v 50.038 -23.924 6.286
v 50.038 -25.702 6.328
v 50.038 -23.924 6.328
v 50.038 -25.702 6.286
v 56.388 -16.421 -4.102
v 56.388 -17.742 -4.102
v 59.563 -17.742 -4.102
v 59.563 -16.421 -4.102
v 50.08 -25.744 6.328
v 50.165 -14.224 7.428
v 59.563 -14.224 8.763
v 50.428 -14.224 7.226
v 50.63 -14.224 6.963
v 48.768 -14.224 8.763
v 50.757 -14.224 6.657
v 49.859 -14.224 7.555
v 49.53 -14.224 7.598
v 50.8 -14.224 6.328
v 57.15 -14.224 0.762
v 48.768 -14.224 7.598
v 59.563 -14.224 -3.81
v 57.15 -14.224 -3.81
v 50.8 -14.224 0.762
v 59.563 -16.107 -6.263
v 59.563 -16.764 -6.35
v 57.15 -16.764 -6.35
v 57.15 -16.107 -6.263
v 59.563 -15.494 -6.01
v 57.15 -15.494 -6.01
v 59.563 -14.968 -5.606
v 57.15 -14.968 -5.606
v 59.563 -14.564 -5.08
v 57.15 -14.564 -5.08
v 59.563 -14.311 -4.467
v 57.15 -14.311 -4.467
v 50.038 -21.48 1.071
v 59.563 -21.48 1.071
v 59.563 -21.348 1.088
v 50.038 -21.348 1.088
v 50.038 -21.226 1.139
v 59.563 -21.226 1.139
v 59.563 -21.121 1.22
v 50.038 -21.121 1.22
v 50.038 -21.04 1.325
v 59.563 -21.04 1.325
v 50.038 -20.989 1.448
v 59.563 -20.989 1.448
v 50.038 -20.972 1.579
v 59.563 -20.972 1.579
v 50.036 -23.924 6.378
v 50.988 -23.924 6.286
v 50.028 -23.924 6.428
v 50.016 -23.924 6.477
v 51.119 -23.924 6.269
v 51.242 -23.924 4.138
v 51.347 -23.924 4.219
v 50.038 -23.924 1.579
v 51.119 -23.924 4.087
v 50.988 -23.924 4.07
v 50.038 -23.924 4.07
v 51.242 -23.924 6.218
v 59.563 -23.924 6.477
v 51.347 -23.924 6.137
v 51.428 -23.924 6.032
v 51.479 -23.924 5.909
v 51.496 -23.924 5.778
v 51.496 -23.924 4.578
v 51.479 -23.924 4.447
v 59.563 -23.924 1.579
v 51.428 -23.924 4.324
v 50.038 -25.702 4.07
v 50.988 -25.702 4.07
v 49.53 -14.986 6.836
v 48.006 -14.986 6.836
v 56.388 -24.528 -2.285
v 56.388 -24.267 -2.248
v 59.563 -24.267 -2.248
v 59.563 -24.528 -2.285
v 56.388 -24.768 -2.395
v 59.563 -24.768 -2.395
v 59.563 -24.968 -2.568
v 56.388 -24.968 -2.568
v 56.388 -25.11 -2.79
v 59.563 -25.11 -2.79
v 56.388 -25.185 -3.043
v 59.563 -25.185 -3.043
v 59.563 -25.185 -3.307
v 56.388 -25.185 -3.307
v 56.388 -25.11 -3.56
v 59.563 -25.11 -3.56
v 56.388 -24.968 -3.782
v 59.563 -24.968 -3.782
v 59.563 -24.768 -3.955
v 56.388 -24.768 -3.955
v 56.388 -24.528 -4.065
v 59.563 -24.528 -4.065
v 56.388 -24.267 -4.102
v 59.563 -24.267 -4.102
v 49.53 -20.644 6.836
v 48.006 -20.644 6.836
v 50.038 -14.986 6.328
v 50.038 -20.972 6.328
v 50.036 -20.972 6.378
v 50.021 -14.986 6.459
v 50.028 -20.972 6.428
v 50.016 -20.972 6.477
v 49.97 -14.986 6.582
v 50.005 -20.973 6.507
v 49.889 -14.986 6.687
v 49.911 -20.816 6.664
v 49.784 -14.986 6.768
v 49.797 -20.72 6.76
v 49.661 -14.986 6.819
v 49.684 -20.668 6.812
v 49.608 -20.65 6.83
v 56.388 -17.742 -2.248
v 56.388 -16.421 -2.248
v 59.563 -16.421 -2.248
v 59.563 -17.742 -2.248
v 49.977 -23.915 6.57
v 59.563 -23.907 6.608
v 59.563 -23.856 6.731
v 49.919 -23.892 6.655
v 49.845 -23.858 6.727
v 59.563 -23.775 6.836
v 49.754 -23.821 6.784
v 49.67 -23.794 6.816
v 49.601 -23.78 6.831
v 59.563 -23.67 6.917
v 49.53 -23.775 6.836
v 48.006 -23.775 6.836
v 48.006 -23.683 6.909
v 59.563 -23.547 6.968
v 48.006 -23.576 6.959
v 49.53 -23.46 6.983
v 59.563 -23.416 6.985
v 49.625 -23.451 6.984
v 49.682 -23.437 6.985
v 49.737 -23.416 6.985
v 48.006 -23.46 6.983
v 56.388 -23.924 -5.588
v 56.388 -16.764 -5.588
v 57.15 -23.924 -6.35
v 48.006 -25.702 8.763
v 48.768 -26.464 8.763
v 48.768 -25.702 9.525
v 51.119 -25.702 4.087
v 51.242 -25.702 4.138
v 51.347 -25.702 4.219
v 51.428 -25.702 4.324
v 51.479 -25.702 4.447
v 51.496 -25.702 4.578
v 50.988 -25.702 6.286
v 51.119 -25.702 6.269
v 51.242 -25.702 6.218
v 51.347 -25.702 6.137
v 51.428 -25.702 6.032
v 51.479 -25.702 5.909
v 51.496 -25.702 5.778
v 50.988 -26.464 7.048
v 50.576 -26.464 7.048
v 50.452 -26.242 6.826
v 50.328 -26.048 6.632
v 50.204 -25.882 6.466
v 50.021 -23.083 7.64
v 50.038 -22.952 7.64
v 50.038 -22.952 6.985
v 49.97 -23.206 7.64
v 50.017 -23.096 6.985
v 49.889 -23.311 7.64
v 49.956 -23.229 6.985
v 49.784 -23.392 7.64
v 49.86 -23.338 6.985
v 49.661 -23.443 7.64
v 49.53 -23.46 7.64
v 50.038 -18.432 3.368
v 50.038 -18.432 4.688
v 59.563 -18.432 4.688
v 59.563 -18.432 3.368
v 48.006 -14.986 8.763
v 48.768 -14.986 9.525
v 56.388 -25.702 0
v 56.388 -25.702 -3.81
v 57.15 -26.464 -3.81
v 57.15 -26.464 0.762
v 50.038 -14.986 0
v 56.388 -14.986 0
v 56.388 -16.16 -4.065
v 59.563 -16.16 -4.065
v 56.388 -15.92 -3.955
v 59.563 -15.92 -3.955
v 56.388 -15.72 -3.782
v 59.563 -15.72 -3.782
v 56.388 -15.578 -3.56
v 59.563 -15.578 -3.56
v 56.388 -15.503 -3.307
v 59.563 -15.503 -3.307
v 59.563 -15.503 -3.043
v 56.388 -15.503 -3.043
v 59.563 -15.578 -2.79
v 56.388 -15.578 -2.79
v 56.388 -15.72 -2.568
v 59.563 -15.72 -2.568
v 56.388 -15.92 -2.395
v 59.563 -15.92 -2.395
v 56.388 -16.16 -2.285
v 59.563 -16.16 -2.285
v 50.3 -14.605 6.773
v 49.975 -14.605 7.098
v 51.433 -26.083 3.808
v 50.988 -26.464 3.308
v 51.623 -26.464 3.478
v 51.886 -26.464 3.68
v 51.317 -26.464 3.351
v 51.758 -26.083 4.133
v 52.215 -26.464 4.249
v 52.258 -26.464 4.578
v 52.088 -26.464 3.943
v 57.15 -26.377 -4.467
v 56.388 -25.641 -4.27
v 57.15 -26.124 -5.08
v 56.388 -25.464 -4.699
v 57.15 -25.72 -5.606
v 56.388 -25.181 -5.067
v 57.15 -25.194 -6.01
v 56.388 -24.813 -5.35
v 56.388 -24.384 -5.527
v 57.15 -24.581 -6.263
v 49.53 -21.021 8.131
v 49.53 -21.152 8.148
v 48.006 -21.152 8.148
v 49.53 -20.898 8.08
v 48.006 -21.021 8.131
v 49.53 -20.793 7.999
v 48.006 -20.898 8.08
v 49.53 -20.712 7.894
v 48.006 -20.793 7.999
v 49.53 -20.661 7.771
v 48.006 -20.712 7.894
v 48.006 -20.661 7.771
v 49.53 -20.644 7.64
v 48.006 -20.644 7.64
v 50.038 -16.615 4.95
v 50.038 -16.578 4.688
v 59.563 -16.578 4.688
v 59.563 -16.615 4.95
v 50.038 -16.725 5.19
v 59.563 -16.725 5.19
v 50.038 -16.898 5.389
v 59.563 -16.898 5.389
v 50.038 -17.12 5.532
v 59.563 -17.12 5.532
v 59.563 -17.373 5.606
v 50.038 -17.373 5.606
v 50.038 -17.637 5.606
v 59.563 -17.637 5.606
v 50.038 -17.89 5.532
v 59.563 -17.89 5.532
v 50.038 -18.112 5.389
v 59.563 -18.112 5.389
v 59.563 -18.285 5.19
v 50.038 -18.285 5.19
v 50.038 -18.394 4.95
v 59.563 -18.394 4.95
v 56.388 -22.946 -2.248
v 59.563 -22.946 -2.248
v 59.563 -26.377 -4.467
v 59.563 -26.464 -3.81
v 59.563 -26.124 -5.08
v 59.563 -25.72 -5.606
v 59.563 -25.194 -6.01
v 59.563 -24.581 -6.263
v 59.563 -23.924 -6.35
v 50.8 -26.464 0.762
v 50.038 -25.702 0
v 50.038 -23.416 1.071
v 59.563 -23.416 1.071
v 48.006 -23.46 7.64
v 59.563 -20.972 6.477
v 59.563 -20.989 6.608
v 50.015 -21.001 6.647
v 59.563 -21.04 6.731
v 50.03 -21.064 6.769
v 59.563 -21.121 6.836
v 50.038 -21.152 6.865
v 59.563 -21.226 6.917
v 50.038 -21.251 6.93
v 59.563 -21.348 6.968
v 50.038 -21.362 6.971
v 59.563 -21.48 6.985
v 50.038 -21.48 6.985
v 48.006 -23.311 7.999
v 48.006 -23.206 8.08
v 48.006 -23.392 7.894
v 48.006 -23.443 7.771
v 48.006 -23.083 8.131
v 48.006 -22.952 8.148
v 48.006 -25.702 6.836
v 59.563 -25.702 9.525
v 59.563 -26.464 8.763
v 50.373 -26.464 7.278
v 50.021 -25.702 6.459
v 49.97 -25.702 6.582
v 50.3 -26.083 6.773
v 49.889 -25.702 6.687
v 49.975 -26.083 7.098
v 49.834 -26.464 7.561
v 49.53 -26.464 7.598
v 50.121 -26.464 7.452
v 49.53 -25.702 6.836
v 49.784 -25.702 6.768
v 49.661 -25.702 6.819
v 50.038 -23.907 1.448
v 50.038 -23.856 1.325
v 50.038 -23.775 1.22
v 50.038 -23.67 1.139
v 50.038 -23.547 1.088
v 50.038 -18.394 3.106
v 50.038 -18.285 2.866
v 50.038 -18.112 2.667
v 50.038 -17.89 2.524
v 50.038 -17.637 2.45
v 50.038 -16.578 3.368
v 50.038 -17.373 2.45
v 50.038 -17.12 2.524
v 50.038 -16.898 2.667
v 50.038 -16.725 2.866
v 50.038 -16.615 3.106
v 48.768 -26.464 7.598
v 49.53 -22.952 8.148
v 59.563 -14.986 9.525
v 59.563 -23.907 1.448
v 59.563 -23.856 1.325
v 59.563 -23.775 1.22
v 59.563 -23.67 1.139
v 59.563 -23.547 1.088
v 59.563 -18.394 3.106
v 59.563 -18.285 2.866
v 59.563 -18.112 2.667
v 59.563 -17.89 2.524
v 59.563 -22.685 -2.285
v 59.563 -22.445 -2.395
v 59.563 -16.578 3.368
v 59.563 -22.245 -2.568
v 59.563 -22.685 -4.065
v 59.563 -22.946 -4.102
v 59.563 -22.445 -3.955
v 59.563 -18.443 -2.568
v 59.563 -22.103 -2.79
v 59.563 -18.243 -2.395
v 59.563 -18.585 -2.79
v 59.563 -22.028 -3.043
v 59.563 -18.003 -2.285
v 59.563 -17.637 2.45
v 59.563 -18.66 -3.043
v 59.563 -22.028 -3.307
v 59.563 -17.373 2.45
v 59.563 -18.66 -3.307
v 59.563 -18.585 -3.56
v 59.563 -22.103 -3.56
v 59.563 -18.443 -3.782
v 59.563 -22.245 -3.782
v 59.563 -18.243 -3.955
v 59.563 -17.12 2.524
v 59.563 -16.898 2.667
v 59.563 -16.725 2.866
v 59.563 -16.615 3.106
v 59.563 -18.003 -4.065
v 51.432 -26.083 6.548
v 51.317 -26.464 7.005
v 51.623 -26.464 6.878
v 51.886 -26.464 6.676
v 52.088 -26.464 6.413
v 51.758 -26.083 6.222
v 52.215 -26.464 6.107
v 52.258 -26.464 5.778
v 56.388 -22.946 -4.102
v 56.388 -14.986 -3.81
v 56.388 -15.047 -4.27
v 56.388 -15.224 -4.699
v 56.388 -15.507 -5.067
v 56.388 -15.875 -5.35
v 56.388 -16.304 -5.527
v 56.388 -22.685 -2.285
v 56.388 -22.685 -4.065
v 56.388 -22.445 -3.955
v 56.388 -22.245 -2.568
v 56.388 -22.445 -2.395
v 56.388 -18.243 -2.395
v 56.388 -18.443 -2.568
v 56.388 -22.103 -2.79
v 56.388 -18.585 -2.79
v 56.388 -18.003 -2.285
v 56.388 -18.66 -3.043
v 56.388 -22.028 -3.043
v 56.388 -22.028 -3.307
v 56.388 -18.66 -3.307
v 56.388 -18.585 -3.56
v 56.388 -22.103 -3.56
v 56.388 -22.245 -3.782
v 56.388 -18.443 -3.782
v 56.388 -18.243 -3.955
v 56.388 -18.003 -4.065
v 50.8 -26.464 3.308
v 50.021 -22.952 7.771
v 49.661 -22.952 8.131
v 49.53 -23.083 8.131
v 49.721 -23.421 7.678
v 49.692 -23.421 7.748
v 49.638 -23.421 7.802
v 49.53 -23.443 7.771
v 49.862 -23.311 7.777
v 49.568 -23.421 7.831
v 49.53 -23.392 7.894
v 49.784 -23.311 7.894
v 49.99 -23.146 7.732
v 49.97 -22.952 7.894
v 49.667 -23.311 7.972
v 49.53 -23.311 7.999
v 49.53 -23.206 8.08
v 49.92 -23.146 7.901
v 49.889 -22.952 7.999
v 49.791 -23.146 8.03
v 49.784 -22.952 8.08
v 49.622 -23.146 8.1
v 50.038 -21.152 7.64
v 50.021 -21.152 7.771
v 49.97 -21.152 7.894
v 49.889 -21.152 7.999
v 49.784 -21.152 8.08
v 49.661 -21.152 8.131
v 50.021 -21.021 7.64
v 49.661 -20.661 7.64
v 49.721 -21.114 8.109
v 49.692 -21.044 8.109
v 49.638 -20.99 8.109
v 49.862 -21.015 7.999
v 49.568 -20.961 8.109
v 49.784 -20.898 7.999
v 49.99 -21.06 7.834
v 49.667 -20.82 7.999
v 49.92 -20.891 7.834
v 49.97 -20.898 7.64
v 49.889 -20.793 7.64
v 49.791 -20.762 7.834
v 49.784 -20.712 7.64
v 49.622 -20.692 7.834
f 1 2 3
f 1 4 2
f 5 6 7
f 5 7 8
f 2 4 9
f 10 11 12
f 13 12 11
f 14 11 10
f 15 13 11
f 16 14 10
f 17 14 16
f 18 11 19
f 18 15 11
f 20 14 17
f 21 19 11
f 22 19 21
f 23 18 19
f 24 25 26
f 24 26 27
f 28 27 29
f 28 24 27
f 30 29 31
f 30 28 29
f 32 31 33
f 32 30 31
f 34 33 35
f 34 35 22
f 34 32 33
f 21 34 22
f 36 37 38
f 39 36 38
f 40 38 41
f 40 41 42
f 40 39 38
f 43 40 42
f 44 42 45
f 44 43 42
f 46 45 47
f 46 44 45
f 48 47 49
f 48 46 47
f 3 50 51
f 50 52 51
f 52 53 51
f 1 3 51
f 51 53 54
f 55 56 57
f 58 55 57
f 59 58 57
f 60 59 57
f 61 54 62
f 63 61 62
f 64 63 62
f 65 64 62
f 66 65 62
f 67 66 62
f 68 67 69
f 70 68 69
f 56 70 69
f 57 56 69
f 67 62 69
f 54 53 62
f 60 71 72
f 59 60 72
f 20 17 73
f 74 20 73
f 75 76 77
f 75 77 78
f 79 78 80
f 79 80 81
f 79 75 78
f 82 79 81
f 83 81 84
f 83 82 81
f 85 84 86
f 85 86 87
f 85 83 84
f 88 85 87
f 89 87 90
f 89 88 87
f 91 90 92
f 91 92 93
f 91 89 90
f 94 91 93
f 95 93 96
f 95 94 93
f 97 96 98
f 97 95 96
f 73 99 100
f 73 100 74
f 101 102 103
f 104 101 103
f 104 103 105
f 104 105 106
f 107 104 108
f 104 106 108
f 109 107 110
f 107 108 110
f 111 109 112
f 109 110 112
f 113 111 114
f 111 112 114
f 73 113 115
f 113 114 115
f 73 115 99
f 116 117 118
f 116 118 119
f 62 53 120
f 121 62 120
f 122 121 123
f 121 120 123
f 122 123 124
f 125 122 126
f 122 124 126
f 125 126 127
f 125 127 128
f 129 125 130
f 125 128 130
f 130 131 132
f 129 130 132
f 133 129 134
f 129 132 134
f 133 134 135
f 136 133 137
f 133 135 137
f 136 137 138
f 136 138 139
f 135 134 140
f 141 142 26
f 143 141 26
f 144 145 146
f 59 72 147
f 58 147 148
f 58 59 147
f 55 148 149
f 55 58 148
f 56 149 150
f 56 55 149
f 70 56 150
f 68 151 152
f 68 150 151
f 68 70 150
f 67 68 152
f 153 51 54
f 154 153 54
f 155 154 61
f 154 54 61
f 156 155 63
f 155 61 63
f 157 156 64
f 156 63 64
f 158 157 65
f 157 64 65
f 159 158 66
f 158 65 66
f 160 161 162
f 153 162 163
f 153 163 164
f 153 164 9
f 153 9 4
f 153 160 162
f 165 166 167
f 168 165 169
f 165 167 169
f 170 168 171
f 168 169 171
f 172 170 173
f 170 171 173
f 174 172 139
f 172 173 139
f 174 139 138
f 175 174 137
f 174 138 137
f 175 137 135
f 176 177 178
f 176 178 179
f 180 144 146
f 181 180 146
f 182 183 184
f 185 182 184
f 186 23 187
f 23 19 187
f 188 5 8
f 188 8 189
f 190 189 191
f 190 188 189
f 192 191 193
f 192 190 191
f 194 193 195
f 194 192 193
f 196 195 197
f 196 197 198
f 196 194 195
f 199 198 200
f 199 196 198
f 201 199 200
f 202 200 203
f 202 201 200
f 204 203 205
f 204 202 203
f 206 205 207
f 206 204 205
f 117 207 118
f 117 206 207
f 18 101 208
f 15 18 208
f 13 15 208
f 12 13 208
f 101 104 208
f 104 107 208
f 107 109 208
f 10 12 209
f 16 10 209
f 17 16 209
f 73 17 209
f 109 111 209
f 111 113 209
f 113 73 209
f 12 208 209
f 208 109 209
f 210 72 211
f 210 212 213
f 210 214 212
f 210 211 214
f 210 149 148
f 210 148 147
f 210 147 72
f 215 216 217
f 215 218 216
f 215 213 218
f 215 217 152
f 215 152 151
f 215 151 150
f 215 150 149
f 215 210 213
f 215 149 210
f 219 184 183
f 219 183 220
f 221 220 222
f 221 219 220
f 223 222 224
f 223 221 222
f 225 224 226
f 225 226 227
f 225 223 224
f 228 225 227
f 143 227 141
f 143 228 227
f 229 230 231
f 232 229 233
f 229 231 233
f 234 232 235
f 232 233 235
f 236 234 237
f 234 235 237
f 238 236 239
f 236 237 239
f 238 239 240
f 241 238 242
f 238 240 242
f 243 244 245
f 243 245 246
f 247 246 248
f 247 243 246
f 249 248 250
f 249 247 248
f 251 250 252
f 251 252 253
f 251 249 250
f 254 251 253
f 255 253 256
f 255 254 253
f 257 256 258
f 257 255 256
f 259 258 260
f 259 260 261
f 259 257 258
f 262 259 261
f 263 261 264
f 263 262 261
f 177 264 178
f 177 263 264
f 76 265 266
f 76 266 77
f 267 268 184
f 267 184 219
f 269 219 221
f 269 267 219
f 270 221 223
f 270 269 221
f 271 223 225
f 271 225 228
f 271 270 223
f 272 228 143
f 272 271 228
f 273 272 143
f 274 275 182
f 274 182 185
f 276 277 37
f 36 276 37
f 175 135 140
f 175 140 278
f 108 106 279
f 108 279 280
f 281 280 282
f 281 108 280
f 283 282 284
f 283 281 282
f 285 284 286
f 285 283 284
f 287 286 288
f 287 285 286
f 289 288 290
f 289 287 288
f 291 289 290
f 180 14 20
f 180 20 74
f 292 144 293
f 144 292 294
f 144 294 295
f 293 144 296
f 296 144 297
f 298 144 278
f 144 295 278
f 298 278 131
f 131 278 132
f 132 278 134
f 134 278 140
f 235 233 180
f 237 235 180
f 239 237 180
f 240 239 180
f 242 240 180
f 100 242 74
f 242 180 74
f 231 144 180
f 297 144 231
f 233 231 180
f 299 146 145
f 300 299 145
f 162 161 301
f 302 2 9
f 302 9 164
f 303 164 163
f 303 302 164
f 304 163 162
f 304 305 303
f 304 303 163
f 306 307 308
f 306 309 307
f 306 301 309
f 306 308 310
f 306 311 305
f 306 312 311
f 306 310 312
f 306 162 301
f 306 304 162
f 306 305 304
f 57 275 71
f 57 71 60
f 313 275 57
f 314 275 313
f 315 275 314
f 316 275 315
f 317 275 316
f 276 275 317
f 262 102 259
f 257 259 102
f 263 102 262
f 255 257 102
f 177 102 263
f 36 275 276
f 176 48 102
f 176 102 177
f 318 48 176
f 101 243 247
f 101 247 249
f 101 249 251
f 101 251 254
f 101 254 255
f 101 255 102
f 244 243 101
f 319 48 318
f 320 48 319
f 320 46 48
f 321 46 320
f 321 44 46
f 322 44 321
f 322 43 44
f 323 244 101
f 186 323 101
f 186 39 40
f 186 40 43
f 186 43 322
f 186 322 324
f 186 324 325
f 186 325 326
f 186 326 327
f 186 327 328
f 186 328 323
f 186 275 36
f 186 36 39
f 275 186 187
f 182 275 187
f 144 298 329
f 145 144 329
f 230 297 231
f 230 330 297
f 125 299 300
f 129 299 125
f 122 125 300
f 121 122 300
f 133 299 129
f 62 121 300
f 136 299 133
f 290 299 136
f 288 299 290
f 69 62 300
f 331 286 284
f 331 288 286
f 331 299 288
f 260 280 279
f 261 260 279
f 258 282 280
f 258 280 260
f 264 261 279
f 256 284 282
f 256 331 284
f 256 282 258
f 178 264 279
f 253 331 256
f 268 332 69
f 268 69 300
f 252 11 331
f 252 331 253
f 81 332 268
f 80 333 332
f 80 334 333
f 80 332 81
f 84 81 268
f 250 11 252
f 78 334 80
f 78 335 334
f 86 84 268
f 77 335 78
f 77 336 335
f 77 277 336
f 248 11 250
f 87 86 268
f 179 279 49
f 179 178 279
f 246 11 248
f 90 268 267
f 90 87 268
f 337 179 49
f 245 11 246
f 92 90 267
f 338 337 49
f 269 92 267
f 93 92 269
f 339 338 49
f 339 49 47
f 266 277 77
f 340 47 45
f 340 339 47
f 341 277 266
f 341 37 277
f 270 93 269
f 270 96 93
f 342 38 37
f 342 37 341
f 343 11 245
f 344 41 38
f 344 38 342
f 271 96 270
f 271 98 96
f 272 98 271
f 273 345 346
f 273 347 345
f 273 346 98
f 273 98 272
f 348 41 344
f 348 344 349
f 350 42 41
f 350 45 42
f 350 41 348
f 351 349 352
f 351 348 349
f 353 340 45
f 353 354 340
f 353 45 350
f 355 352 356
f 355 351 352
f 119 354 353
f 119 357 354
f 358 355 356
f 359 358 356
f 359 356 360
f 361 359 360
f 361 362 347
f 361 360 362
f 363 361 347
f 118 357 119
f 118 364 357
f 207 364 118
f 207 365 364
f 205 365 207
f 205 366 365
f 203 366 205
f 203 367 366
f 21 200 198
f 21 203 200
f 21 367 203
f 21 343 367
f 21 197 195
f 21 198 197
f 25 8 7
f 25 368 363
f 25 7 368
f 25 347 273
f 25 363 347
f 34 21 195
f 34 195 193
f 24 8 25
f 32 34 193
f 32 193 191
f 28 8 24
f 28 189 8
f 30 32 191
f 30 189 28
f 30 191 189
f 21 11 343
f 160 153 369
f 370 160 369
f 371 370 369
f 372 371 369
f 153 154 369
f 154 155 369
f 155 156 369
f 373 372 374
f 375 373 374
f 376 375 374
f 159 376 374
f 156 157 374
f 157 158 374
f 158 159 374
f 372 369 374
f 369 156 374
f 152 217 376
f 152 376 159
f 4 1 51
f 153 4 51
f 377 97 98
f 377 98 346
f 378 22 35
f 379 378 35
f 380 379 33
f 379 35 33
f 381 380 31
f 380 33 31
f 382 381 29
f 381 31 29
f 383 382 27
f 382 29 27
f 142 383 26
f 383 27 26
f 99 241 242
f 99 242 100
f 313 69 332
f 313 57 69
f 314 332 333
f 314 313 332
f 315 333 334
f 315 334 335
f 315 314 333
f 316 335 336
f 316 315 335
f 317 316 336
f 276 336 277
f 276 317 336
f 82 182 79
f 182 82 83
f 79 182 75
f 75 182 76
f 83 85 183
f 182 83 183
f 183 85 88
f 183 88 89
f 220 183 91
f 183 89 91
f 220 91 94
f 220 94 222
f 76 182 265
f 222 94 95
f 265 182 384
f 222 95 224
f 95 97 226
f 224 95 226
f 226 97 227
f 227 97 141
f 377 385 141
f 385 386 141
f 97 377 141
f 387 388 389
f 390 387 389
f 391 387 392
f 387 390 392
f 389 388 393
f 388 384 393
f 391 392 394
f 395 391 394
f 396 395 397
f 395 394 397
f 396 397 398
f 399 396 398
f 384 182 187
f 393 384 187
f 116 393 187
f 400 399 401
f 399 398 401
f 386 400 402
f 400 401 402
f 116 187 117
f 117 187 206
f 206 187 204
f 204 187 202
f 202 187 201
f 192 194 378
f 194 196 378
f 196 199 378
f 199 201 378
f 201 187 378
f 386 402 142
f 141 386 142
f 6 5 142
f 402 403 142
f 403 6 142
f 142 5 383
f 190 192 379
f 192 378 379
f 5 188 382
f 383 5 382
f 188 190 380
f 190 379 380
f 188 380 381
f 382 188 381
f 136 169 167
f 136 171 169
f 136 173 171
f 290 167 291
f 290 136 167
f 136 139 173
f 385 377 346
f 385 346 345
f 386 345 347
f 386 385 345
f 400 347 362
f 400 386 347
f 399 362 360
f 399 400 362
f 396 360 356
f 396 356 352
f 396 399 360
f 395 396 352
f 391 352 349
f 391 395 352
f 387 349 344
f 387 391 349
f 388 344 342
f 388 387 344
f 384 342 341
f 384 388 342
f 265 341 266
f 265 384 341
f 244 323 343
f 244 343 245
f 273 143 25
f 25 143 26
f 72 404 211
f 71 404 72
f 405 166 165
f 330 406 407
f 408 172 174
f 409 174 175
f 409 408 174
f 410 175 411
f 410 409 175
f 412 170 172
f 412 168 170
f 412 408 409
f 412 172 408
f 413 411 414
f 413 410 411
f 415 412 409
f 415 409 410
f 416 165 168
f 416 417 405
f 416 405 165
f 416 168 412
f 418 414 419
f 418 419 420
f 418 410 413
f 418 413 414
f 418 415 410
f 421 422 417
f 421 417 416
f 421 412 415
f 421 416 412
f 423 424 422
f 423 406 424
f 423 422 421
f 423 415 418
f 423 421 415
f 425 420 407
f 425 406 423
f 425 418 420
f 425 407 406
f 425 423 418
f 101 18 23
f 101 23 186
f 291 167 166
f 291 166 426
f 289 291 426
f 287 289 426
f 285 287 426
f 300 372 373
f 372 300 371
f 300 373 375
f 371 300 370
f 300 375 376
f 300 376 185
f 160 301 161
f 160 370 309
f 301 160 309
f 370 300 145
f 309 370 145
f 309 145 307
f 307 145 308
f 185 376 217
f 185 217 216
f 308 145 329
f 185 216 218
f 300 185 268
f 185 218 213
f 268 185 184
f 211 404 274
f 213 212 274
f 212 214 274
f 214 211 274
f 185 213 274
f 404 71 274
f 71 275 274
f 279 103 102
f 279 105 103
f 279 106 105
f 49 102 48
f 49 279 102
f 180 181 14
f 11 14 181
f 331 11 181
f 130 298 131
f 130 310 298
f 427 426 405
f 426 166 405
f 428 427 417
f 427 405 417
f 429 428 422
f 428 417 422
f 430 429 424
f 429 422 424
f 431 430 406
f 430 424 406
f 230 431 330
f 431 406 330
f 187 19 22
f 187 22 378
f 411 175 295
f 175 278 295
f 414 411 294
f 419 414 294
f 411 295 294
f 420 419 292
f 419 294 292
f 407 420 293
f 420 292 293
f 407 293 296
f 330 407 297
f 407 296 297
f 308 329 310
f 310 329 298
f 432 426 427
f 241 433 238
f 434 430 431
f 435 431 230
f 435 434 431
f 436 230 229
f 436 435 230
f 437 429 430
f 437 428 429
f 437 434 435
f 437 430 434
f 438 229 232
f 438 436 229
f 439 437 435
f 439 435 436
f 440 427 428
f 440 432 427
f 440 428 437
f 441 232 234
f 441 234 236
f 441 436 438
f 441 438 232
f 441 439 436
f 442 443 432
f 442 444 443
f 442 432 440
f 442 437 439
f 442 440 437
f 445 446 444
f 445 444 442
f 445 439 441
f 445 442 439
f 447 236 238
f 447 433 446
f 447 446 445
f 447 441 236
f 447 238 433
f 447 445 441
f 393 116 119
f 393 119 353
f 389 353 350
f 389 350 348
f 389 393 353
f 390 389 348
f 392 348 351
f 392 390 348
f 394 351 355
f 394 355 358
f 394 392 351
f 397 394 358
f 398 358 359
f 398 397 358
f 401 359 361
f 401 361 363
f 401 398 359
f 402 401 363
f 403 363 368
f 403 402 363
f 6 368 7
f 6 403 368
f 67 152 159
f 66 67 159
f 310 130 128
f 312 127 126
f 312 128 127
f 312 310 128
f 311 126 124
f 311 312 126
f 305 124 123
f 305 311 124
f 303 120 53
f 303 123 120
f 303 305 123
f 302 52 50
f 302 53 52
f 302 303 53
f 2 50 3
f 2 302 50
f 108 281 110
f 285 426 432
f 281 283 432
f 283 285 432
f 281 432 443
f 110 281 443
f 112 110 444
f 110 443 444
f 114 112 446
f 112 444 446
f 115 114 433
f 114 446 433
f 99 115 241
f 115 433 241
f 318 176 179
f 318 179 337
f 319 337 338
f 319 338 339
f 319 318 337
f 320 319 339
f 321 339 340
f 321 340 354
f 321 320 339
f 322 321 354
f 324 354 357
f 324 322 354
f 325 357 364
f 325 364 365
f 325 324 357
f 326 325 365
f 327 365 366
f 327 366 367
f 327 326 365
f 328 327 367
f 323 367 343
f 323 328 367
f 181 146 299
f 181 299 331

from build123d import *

# Parameters (mm, degrees)
SKETCH1_W                 = 6.35
SKETCH1_H                 = 12.24
BOSS_EXTRUDE1_DEPTH       = 8.255
BOSS_EXTRUDE2_DEPTH       = 2.032
BOSS_EXTRUDE2_DEPTH_BACK  = 6.35
SKETCH3_W                 = 1.458
SKETCH3_H                 = 2.216
CUT_EXTRUDE1_DEPTH        = 3.81
SKETCH9_W                 = 15.875
SKETCH9_H                 = 12.24
BOSS_EXTRUDE3_DEPTH       = 3.175
FILLET2_R                 = 2.54
F_0_START                 = 50.038
F_0_CLEARANCE_SLOT1_DEPTH = 9.525
F_0_START_2               = 56.388
F_0_CLEARANCE_SLOT2_DEPTH = 3.175
FILLET3_R                 = 0.508
SKETCH12_W                = 5.914
SKETCH12_H                = 2.952219173
CUT_EXTRUDE2_DEPTH        = 31.407781492
FILLET4_R                 = 0.508


# Read off the part's stored shape, not the designer's step: #0 Clearance Slot1, #0 Clearance Slot2
with BuildPart() as part:
    # Sketch1 → Boss-Extrude1 (new body)
    with BuildSketch(Plane.XY):
        with Locations((53.213, -20.344)):
            Rectangle(SKETCH1_W, SKETCH1_H)
    extrude(amount=BOSS_EXTRUDE1_DEPTH)

    # Sketch2 → Boss-Extrude2 (add, two sides: drawn at the far end of the back side and taken through both)
    with BuildSketch(Plane.ZY.offset(-50.038).offset(-BOSS_EXTRUDE2_DEPTH_BACK)):
        Polygon((9.525, -26.464), (6.836, -26.464), (6.836, -23.46), (8.148, -23.46), (8.148, -20.644), (6.836, -20.644), (6.836, -14.224), (9.525, -14.224), align=None)
    extrude(amount=BOSS_EXTRUDE2_DEPTH + BOSS_EXTRUDE2_DEPTH_BACK)

    # Sketch3 → Cut-Extrude1 (cut)
    with BuildSketch(Plane.XZ.offset(26.464)):
        with Locations((50.767, 5.178)):
            Rectangle(SKETCH3_W, SKETCH3_H)
    extrude(amount=-CUT_EXTRUDE1_DEPTH, mode=Mode.SUBTRACT)

    # Sketch9 → Boss-Extrude3 (add)
    with BuildSketch(Plane(origin=(56.388, 0, 0), x_dir=(0, 0, -1), z_dir=(1, 0, 0))):
        with Locations((-1.5875, -20.344)):
            Rectangle(SKETCH9_W, SKETCH9_H)
    extrude(amount=BOSS_EXTRUDE3_DEPTH)

    # Fillet2
    fillet2_edges = [part.edges().sort_by_distance(p)[0] for p in [
        (57.9755, -14.224, -6.35),
        (57.9755, -26.464, -6.35),
    ]]
    fillet(fillet2_edges, radius=FILLET2_R)

    # #0 Clearance Slot1 outline → #0 Clearance Slot1 (cut)
    with BuildSketch(Plane.YZ.offset(F_0_START)):
        with BuildLine():
            Line((-18.431780827, 4.6884), (-18.431780827, 3.3676))
            ThreePointArc((-18.431780827, 3.3676), (-17.504680827, 2.4405), (-16.577580827, 3.3676))
            Line((-16.577580827, 3.3676), (-16.577580827, 4.6884))
            ThreePointArc((-16.577580827, 4.6884), (-17.504680827, 5.6155), (-18.431780827, 4.6884))
        make_face()
    extrude(amount=F_0_CLEARANCE_SLOT1_DEPTH, mode=Mode.SUBTRACT)

    # #0 Clearance Slot2 outline → #0 Clearance Slot2 (cut)
    with BuildSketch(Plane.YZ.offset(F_0_START_2)):
        with BuildLine():
            Line((-22.9461, -2.2479), (-24.2669, -2.2479))
            ThreePointArc((-24.2669, -2.2479), (-25.194, -3.175), (-24.2669, -4.1021))
            Line((-24.2669, -4.1021), (-22.9461, -4.1021))
            ThreePointArc((-22.9461, -4.1021), (-22.019, -3.175), (-22.9461, -2.2479))
        make_face()
        with BuildLine():
            ThreePointArc((-16.4211, -4.1021), (-15.494, -3.175), (-16.4211, -2.2479))
            Line((-16.4211, -2.2479), (-17.7419, -2.2479))
            ThreePointArc((-17.7419, -2.2479), (-18.669, -3.175), (-17.7419, -4.1021))
            Line((-17.7419, -4.1021), (-16.4211, -4.1021))
        make_face()
    extrude(amount=F_0_CLEARANCE_SLOT2_DEPTH, mode=Mode.SUBTRACT)

    # Fillet3
    fillet3_edges = [part.edges().sort_by_distance(p)[0] for p in [
        (50.038, -17.434, 6.836),
        (50.038, -20.644, 7.492),
        (50.038, -22.052, 8.148),
        (50.038, -23.46, 7.492),
        (49.022, -23.46, 8.148),
        (49.022, -20.644, 8.148),
        (50.038, -24.962, 6.836),
        (50.767, -22.654, 6.286),
        (51.496, -22.654, 5.178),
        (51.496, -24.559, 6.286),
        (50.767, -22.654, 4.07),
        (51.496, -24.559, 4.07),
    ]]
    fillet(fillet3_edges, radius=FILLET3_R)

    # Chamfer3
    # the kernel refuses this chamfer: 0.762 mm, written as the material it takes off along each edge
    with BuildSketch(Plane(origin=(48.514, -25.956, 9.017), x_dir=(0, -0.7071067811865475, -0.7071067811865475), z_dir=(-0.5773502691896257, -0.5773502691896257, 0.5773502691896257)), Plane(origin=(48.514, -14.732, 9.017), x_dir=(0, -0.7071067811865475, 0.7071067811865475), z_dir=(-0.5773502691896257, 0.5773502691896257, 0.5773502691896257))) as chamfer3_piece_1:
        Polygon((-0.538815367, 0.311085197), (0.538815367, 0.311085197), (0, -0.622170395), align=None)
    extrude(amount=0.967869991, mode=Mode.SUBTRACT)
    with BuildSketch(Plane(origin=(49.53, -14.224, 6.836), x_dir=(0, 0.027495876610587274, 0.9996219169112966), z_dir=(-1, 0, 0)), Plane(origin=(46.046377563, -26.464, 6.836), x_dir=(0, -0.027495876610587274, 0.9996219169112966), z_dir=(1, 0, 0))) as chamfer3_piece_2:
        with BuildLine():
            Line((0.783848975, 0), (-0.043088932, -0.782663759))
            Line((-0.043088932, -0.782663759), (-0.05832317, -0.782244722))
            ThreePointArc((-0.05832317, -0.782244722), (-0.026006471, -0.391209146), (-0.015234238, 0.000419037))
            Line((-0.015234238, 0.000419037), (0.000419037, 0.015234238))
            ThreePointArc((0.000419037, 0.015234238), (0.392047221, 0.004462005), (0.784268012, 0.015234238))
            Line((0.784268012, 0.015234238), (0.783848975, 0))
        make_face()
    extrude(amount=3.483622437, mode=Mode.SUBTRACT)
    with BuildSketch(Plane(origin=(49.53, -14.224, 6.328), x_dir=(1, 0, 0), z_dir=(0, 0, -1))) as chamfer3_piece_3:
        with BuildLine():
            Line((1.291552615, -0.021552615), (0.486447385, 0.783552615))
            Line((0.486447385, 0.783552615), (0.471207385, 0.783552615))
            ThreePointArc((0.471207385, 0.783552615), (0.49276, 0.391776307), (0.49276, 0))
            Line((0.49276, 0), (0.508, -0.01524))
            ThreePointArc((0.508, -0.01524), (0.899776307, -0.01524), (1.291552615, -0.036792615))
            Line((1.291552615, -0.036792615), (1.291552615, -0.021552615))
        make_face()
    revolve(axis=Axis((49.53, -14.224, 6.328), (0, -1, 0)), revolution_arc=90, mode=Mode.SUBTRACT)
    with BuildSketch(Plane(origin=(50.038, -14.224, -1.959622437), x_dir=(0.9996219169112966, 0.027495876610587368, 0), z_dir=(0, 0, 1))) as chamfer3_piece_4:
        with BuildLine():
            Line((0.783848975, 0), (-0.043088932, -0.782663759))
            Line((-0.043088932, -0.782663759), (-0.05832317, -0.782244722))
            ThreePointArc((-0.05832317, -0.782244722), (-0.026006471, -0.391209146), (-0.015234238, 0.000419037))
            Line((-0.015234238, 0.000419037), (0.000419037, 0.015234238))
            ThreePointArc((0.000419037, 0.015234238), (0.392047221, 0.004462005), (0.784268012, 0.015234238))
            Line((0.784268012, 0.015234238), (0.783848975, 0))
        make_face()
    extrude(amount=8.287622437, mode=Mode.SUBTRACT)
    with BuildSketch(Plane(origin=(56.388, -14.224, 0), x_dir=(0, 0.02749587661058728, 0.9996219169112966), z_dir=(-1, 0, 0))) as chamfer3_piece_5:
        with BuildLine():
            Line((0.783848975, 0), (-0.043088932, -0.782663759))
            Line((-0.043088932, -0.782663759), (-0.05832317, -0.782244722))
            ThreePointArc((-0.05832317, -0.782244722), (-0.026006471, -0.391209146), (-0.015234238, 0.000419037))
            Line((-0.015234238, 0.000419037), (0.000419037, 0.015234238))
            ThreePointArc((0.000419037, 0.015234238), (0.392047221, 0.004462005), (0.784268012, 0.015234238))
            Line((0.784268012, 0.015234238), (0.783848975, 0))
        make_face()
    extrude(amount=8.309622437, mode=Mode.SUBTRACT)
    with BuildSketch(Plane(origin=(49.53, -26.464, 6.328), x_dir=(1, 0, 0), z_dir=(0, 0, -1))) as chamfer3_piece_6:
        with BuildLine():
            Line((1.291552615, 0.021552615), (0.486447385, -0.783552615))
            Line((0.486447385, -0.783552615), (0.471207385, -0.783552615))
            ThreePointArc((0.471207385, -0.783552615), (0.49276, -0.391776307), (0.49276, 0))
            Line((0.49276, 0), (0.508, 0.01524))
            ThreePointArc((0.508, 0.01524), (0.899776307, 0.01524), (1.291552615, 0.036792615))
            Line((1.291552615, 0.036792615), (1.291552615, 0.021552615))
        make_face()
    revolve(axis=Axis((49.53, -26.464, 6.328), (0, -1, 0)), revolution_arc=90, mode=Mode.SUBTRACT)
    with BuildSketch(Plane(origin=(46.046377563, -26.464, 9.525), x_dir=(0, 0.9996219169112968, 0.027495876610587246), z_dir=(1, 0, 0)), Plane(origin=(46.046377563, -14.224, 9.525), x_dir=(0, 0.027495876610587246, -0.9996219169112968), z_dir=(1, 0, 0))) as chamfer3_piece_7:
        with BuildLine():
            Line((0.783848975, 0), (-0.043088932, -0.782663759))
            Line((-0.043088932, -0.782663759), (-0.05832317, -0.782244722))
            ThreePointArc((-0.05832317, -0.782244722), (-0.026006471, -0.391209146), (-0.015234238, 0.000419037))
            Line((-0.015234238, 0.000419037), (0.000419037, 0.015234238))
            ThreePointArc((0.000419037, 0.015234238), (0.392047221, 0.004462005), (0.784268012, 0.015234238))
            Line((0.784268012, 0.015234238), (0.783848975, 0))
        make_face()
    extrude(amount=15.476244874, mode=Mode.SUBTRACT)
    with BuildSketch(Plane(origin=(48.006, -14.224, 4.876377563), x_dir=(0.9996219169112966, 0.027495876610587368, 0), z_dir=(0, 0, 1))) as chamfer3_piece_8:
        with BuildLine():
            Line((0.783848975, 0), (-0.043088932, -0.782663759))
            Line((-0.043088932, -0.782663759), (-0.05832317, -0.782244722))
            ThreePointArc((-0.05832317, -0.782244722), (-0.026006471, -0.391209146), (-0.015234238, 0.000419037))
            Line((-0.015234238, 0.000419037), (0.000419037, 0.015234238))
            ThreePointArc((0.000419037, 0.015234238), (0.392047221, 0.004462005), (0.784268012, 0.015234238))
            Line((0.784268012, 0.015234238), (0.783848975, 0))
        make_face()
    extrude(amount=6.608244874, mode=Mode.SUBTRACT)
    with BuildSketch(Plane(origin=(48.006, -12.264377563, 9.525), x_dir=(-0.027495876610582715, 0, -0.9996219169112968), z_dir=(0, -1, 0))) as chamfer3_piece_9:
        with BuildLine():
            Line((0.783848975, 0), (-0.043088932, 0.782663759))
            Line((-0.043088932, 0.782663759), (-0.05832317, 0.782244722))
            ThreePointArc((-0.05832317, 0.782244722), (-0.026006471, 0.391209146), (-0.015234238, -0.000419037))
            Line((-0.015234238, -0.000419037), (0.000419037, -0.015234238))
            ThreePointArc((0.000419037, -0.015234238), (0.392047221, -0.004462005), (0.784268012, -0.015234238))
            Line((0.784268012, -0.015234238), (0.783848975, 0))
        make_face()
    extrude(amount=16.159244874, mode=Mode.SUBTRACT)
    with BuildSketch(Plane(origin=(48.006, -26.464, 11.484622437), x_dir=(-0.027495876610582715, 0.9996219169112968, 0), z_dir=(0, 0, -1))) as chamfer3_piece_10:
        with BuildLine():
            Line((0.783848975, 0), (-0.043088932, 0.782663759))
            Line((-0.043088932, 0.782663759), (-0.05832317, 0.782244722))
            ThreePointArc((-0.05832317, 0.782244722), (-0.026006471, 0.391209146), (-0.015234238, -0.000419037))
            Line((-0.015234238, -0.000419037), (0.000419037, -0.015234238))
            ThreePointArc((0.000419037, -0.015234238), (0.392047221, -0.004462005), (0.784268012, -0.015234238))
            Line((0.784268012, -0.015234238), (0.783848975, 0))
        make_face()
    extrude(amount=6.608244874, mode=Mode.SUBTRACT)
    with BuildSketch(Plane(origin=(56.388, -14.224, 0), x_dir=(0.9996219169112966, 0.027495876610587368, 0), z_dir=(0, 0, -1))) as chamfer3_piece_11:
        with BuildLine():
            Line((0.783848975, 0), (-0.043088932, 0.782663759))
            Line((-0.043088932, 0.782663759), (-0.05832317, 0.782244722))
            ThreePointArc((-0.05832317, 0.782244722), (-0.026006471, 0.391209146), (-0.015234238, -0.000419037))
            Line((-0.015234238, -0.000419037), (0.000419037, -0.015234238))
            ThreePointArc((0.000419037, -0.015234238), (0.392047221, -0.004462005), (0.784268012, -0.015234238))
            Line((0.784268012, -0.015234238), (0.783848975, 0))
        make_face()
    extrude(amount=3.81, mode=Mode.SUBTRACT)
    with BuildSketch(Plane(origin=(50.988, -26.464, 6.286), x_dir=(0, -0.027495876610587305, 0.9996219169112966), z_dir=(-1, 0, 0)), Plane(origin=(48.078377563, -26.464, 4.07), x_dir=(0, -0.027495876610587288, -0.9996219169112966), z_dir=(1, 0, 0))) as chamfer3_piece_12:
        with BuildLine():
            Line((0.783848975, 0), (-0.043088932, 0.782663759))
            Line((-0.043088932, 0.782663759), (-0.05832317, 0.782244722))
            ThreePointArc((-0.05832317, 0.782244722), (-0.026006471, 0.391209146), (-0.015234238, -0.000419037))
            Line((-0.015234238, -0.000419037), (0.000419037, -0.015234238))
            ThreePointArc((0.000419037, -0.015234238), (0.392047221, -0.004462005), (0.784268012, -0.015234238))
            Line((0.784268012, -0.015234238), (0.783848975, 0))
        make_face()
    extrude(amount=2.909622437, mode=Mode.SUBTRACT)
    with BuildSketch(Plane(origin=(56.388, -16.764, -3.81), x_dir=(0, 1, 0), z_dir=(0, 0, 1))) as chamfer3_piece_13:
        with BuildLine():
            Line((1.756447385, 0.021552615), (2.561552615, -0.783552615))
            Line((2.561552615, -0.783552615), (2.576792615, -0.783552615))
            ThreePointArc((2.576792615, -0.783552615), (2.55524, -0.391776307), (2.55524, 0))
            Line((2.55524, 0), (2.54, 0.01524))
            ThreePointArc((2.54, 0.01524), (2.148223693, 0.01524), (1.756447385, 0.036792615))
            Line((1.756447385, 0.036792615), (1.756447385, 0.021552615))
        make_face()
    revolve(axis=Axis((56.388, -16.764, -3.81), (-1, 0, 0)), revolution_arc=90, mode=Mode.SUBTRACT)
    with BuildSketch(Plane(origin=(50.988, -26.464, 5.778), x_dir=(0, 0, 1), z_dir=(-1, 0, 0))) as chamfer3_piece_14:
        with BuildLine():
            Line((1.291552615, -0.021552615), (0.486447385, 0.783552615))
            Line((0.486447385, 0.783552615), (0.471207385, 0.783552615))
            ThreePointArc((0.471207385, 0.783552615), (0.49276, 0.391776307), (0.49276, 0))
            Line((0.49276, 0), (0.508, -0.01524))
            ThreePointArc((0.508, -0.01524), (0.899776307, -0.01524), (1.291552615, -0.036792615))
            Line((1.291552615, -0.036792615), (1.291552615, -0.021552615))
        make_face()
    revolve(axis=Axis((50.988, -26.464, 5.778), (0, 1, 0)), revolution_arc=90, mode=Mode.SUBTRACT)
    with BuildSketch(Plane(origin=(56.388, -16.764, -6.35), x_dir=(-0.027495876610582747, 0, 0.9996219169112968), z_dir=(0, -1, 0))) as chamfer3_piece_15:
        with BuildLine():
            Line((0.783848975, 0), (-0.043088932, -0.782663759))
            Line((-0.043088932, -0.782663759), (-0.05832317, -0.782244722))
            ThreePointArc((-0.05832317, -0.782244722), (-0.026006471, -0.391209146), (-0.015234238, 0.000419037))
            Line((-0.015234238, 0.000419037), (0.000419037, 0.015234238))
            ThreePointArc((0.000419037, 0.015234238), (0.392047221, 0.004462005), (0.784268012, 0.015234238))
            Line((0.784268012, 0.015234238), (0.783848975, 0))
        make_face()
    extrude(amount=7.16, mode=Mode.SUBTRACT)
    with BuildSketch(Plane(origin=(51.496, -26.464, 4.578), x_dir=(0.9996219169112966, -0.027495876610587368, 0), z_dir=(0, 0, 1))) as chamfer3_piece_16:
        with BuildLine():
            Line((0.783848975, 0), (-0.043088932, 0.782663759))
            Line((-0.043088932, 0.782663759), (-0.05832317, 0.782244722))
            ThreePointArc((-0.05832317, 0.782244722), (-0.026006471, 0.391209146), (-0.015234238, -0.000419037))
            Line((-0.015234238, -0.000419037), (0.000419037, -0.015234238))
            ThreePointArc((0.000419037, -0.015234238), (0.392047221, -0.004462005), (0.784268012, -0.015234238))
            Line((0.784268012, -0.015234238), (0.783848975, 0))
        make_face()
    extrude(amount=1.2, mode=Mode.SUBTRACT)
    with BuildSketch(Plane(origin=(56.388, -23.924, -3.81), x_dir=(0, -1, 0), z_dir=(0, 0, 1))) as chamfer3_piece_17:
        with BuildLine():
            Line((1.756447385, -0.021552615), (2.561552615, 0.783552615))
            Line((2.561552615, 0.783552615), (2.576792615, 0.783552615))
            ThreePointArc((2.576792615, 0.783552615), (2.55524, 0.391776307), (2.55524, 0))
            Line((2.55524, 0), (2.54, -0.01524))
            ThreePointArc((2.54, -0.01524), (2.148223693, -0.01524), (1.756447385, -0.036792615))
            Line((1.756447385, -0.036792615), (1.756447385, -0.021552615))
        make_face()
    revolve(axis=Axis((56.388, -23.924, -3.81), (1, 0, 0)), revolution_arc=90, mode=Mode.SUBTRACT)
    with BuildSketch(Plane(origin=(50.988, -26.464, 4.578), x_dir=(0, 0, -1), z_dir=(-1, 0, 0))) as chamfer3_piece_18:
        with BuildLine():
            Line((1.291552615, 0.021552615), (0.486447385, -0.783552615))
            Line((0.486447385, -0.783552615), (0.471207385, -0.783552615))
            ThreePointArc((0.471207385, -0.783552615), (0.49276, -0.391776307), (0.49276, 0))
            Line((0.49276, 0), (0.508, 0.01524))
            ThreePointArc((0.508, 0.01524), (0.899776307, 0.01524), (1.291552615, 0.036792615))
            Line((1.291552615, 0.036792615), (1.291552615, 0.021552615))
        make_face()
    revolve(axis=Axis((50.988, -26.464, 4.578), (0, -1, 0)), revolution_arc=90, mode=Mode.SUBTRACT)
    with BuildSketch(Plane(origin=(56.388, -26.464, -3.81), x_dir=(-0.027495876610582715, 0.9996219169112968, 0), z_dir=(0, 0, 1))) as chamfer3_piece_19:
        with BuildLine():
            Line((0.783848975, 0), (-0.043088932, -0.782663759))
            Line((-0.043088932, -0.782663759), (-0.05832317, -0.782244722))
            ThreePointArc((-0.05832317, -0.782244722), (-0.026006471, -0.391209146), (-0.015234238, 0.000419037))
            Line((-0.015234238, 0.000419037), (0.000419037, 0.015234238))
            ThreePointArc((0.000419037, 0.015234238), (0.392047221, 0.004462005), (0.784268012, 0.015234238))
            Line((0.784268012, 0.015234238), (0.783848975, 0))
        make_face()
    extrude(amount=3.81, mode=Mode.SUBTRACT)
    with BuildSketch(Plane(origin=(50.038, -26.464, -1.959622437), x_dir=(-0.027495876610582715, 0.9996219169112968, 0), z_dir=(0, 0, 1))) as chamfer3_piece_20:
        with BuildLine():
            Line((0.783848975, 0), (-0.043088932, -0.782663759))
            Line((-0.043088932, -0.782663759), (-0.05832317, -0.782244722))
            ThreePointArc((-0.05832317, -0.782244722), (-0.026006471, -0.391209146), (-0.015234238, 0.000419037))
            Line((-0.015234238, 0.000419037), (0.000419037, 0.015234238))
            ThreePointArc((0.000419037, 0.015234238), (0.392047221, 0.004462005), (0.784268012, 0.015234238))
            Line((0.784268012, 0.015234238), (0.783848975, 0))
        make_face()
    extrude(amount=7.989244874, mode=Mode.SUBTRACT)
    with BuildSketch(Plane(origin=(48.078377563, -26.464, 0), x_dir=(0, 0.9996219169112968, -0.027495876610586327), z_dir=(1, 0, 0))) as chamfer3_piece_21:
        with BuildLine():
            Line((0.783848975, 0), (-0.043088932, 0.782663759))
            Line((-0.043088932, 0.782663759), (-0.05832317, 0.782244722))
            ThreePointArc((-0.05832317, 0.782244722), (-0.026006471, 0.391209146), (-0.015234238, -0.000419037))
            Line((-0.015234238, -0.000419037), (0.000419037, -0.015234238))
            ThreePointArc((0.000419037, -0.015234238), (0.392047221, -0.004462005), (0.784268012, -0.015234238))
            Line((0.784268012, -0.015234238), (0.783848975, 0))
        make_face()
    extrude(amount=8.309622437, mode=Mode.SUBTRACT)
    with BuildSketch(Plane(origin=(50.038, -26.464, 4.326377563), x_dir=(-0.027495876610582715, 0.9996219169112968, 0), z_dir=(0, 0, 1))) as chamfer3_piece_22:
        with BuildLine():
            Line((0.783848975, 0), (-0.043088932, -0.782663759))
            Line((-0.043088932, -0.782663759), (-0.05832317, -0.782244722))
            ThreePointArc((-0.05832317, -0.782244722), (-0.026006471, -0.391209146), (-0.015234238, 0.000419037))
            Line((-0.015234238, 0.000419037), (0.000419037, 0.015234238))
            ThreePointArc((0.000419037, 0.015234238), (0.392047221, 0.004462005), (0.784268012, 0.015234238))
            Line((0.784268012, 0.015234238), (0.783848975, 0))
        make_face()
    extrude(amount=2.001622437, mode=Mode.SUBTRACT)
    with BuildSketch(Plane(origin=(58.347622437, -14.224, 0), x_dir=(0, 0.02749587661058728, 0.9996219169112966), z_dir=(-1, 0, 0))) as chamfer3_piece_23a_section:
        with BuildLine():
            Line((0.783848975, 0), (-0.043088932, -0.782663759))
            Line((-0.043088932, -0.782663759), (-0.05832317, -0.782244722))
            ThreePointArc((-0.05832317, -0.782244722), (-0.026006471, -0.391209146), (-0.015234238, 0.000419037))
            Line((-0.015234238, 0.000419037), (0.000419037, 0.015234238))
            ThreePointArc((0.000419037, 0.015234238), (0.392047221, 0.004462005), (0.784268012, 0.015234238))
            Line((0.784268012, 0.015234238), (0.783848975, 0))
        make_face()
    chamfer3_piece_23a = extrude(amount=10.269244874, mode=Mode.PRIVATE)
    chamfer3_piece_23a = split(chamfer3_piece_23a, bisect_by=Plane(origin=(56.388, -14.475302744, 0.251302744), z_dir=(1, 0, 0)), keep=Keep.TOP, mode=Mode.PRIVATE)
    with BuildSketch(Plane(origin=(56.388, -14.224, 1.959622437), x_dir=(0.9996219169112966, 0.027495876610587368, 0), z_dir=(0, 0, -1))) as chamfer3_piece_23b_section:
        with BuildLine():
            Line((0.783848975, 0), (-0.043088932, 0.782663759))
            Line((-0.043088932, 0.782663759), (-0.05832317, 0.782244722))
            ThreePointArc((-0.05832317, 0.782244722), (-0.026006471, 0.391209146), (-0.015234238, -0.000419037))
            Line((-0.015234238, -0.000419037), (0.000419037, -0.015234238))
            ThreePointArc((0.000419037, -0.015234238), (0.392047221, -0.004462005), (0.784268012, -0.015234238))
            Line((0.784268012, -0.015234238), (0.783848975, 0))
        make_face()
    chamfer3_piece_23b = extrude(amount=5.769622437, mode=Mode.PRIVATE)
    chamfer3_piece_23b = split(chamfer3_piece_23b, bisect_by=Plane(origin=(56.639302744, -14.475302744, 0), z_dir=(0, 0, 1)), keep=Keep.TOP, mode=Mode.PRIVATE)
    chamfer3_piece_23 = chamfer3_piece_23a & chamfer3_piece_23b
    add(chamfer3_piece_23, mode=Mode.SUBTRACT)
    with BuildSketch(Plane(origin=(48.078377563, -26.464, 0), x_dir=(0, 0.9996219169112968, -0.027495876610586327), z_dir=(1, 0, 0))) as chamfer3_piece_24a_section:
        with BuildLine():
            Line((0.783848975, 0), (-0.043088932, 0.782663759))
            Line((-0.043088932, 0.782663759), (-0.05832317, 0.782244722))
            ThreePointArc((-0.05832317, 0.782244722), (-0.026006471, 0.391209146), (-0.015234238, -0.000419037))
            Line((-0.015234238, -0.000419037), (0.000419037, -0.015234238))
            ThreePointArc((0.000419037, -0.015234238), (0.392047221, -0.004462005), (0.784268012, -0.015234238))
            Line((0.784268012, -0.015234238), (0.783848975, 0))
        make_face()
    chamfer3_piece_24a = extrude(amount=10.269244874, mode=Mode.PRIVATE)
    chamfer3_piece_24a = split(chamfer3_piece_24a, bisect_by=Plane(origin=(56.388, -26.212697256, 0.251302744), z_dir=(1, 0, 0)), keep=Keep.TOP, mode=Mode.PRIVATE)
    with BuildSketch(Plane(origin=(56.388, -26.464, -3.81), x_dir=(-0.027495876610582715, 0.9996219169112968, 0), z_dir=(0, 0, 1))) as chamfer3_piece_24b_section:
        with BuildLine():
            Line((0.783848975, 0), (-0.043088932, -0.782663759))
            Line((-0.043088932, -0.782663759), (-0.05832317, -0.782244722))
            ThreePointArc((-0.05832317, -0.782244722), (-0.026006471, -0.391209146), (-0.015234238, 0.000419037))
            Line((-0.015234238, 0.000419037), (0.000419037, 0.015234238))
            ThreePointArc((0.000419037, 0.015234238), (0.392047221, 0.004462005), (0.784268012, 0.015234238))
            Line((0.784268012, 0.015234238), (0.783848975, 0))
        make_face()
    chamfer3_piece_24b = extrude(amount=5.769622437, mode=Mode.PRIVATE)
    chamfer3_piece_24b = split(chamfer3_piece_24b, bisect_by=Plane(origin=(56.639302744, -26.212697256, 0), z_dir=(0, 0, 1)), keep=Keep.TOP, mode=Mode.PRIVATE)
    chamfer3_piece_24 = chamfer3_piece_24a & chamfer3_piece_24b
    add(chamfer3_piece_24, mode=Mode.SUBTRACT)

    # Sketch12 → Cut-Extrude2 (cut, through all)
    with BuildSketch(Plane(origin=(59.563, 0, 0), x_dir=(0, 0, -1), z_dir=(1, 0, 0))):
        with Locations((-4.028, -22.447890414)):
            Rectangle(SKETCH12_W, SKETCH12_H)
    extrude(amount=-CUT_EXTRUDE2_DEPTH, mode=Mode.SUBTRACT)

    # Fillet4
    fillet4_edges = [part.edges().sort_by_distance(p)[0] for p in [
        (53.7845, -23.924, 6.985),
        (54.8005, -23.924, 1.071),
        (54.8005, -20.971780827, 1.071),
        (54.783978972, -20.971780827, 6.985),
    ]]
    fillet(fillet4_edges, radius=FILLET4_R)


solid = part.part
